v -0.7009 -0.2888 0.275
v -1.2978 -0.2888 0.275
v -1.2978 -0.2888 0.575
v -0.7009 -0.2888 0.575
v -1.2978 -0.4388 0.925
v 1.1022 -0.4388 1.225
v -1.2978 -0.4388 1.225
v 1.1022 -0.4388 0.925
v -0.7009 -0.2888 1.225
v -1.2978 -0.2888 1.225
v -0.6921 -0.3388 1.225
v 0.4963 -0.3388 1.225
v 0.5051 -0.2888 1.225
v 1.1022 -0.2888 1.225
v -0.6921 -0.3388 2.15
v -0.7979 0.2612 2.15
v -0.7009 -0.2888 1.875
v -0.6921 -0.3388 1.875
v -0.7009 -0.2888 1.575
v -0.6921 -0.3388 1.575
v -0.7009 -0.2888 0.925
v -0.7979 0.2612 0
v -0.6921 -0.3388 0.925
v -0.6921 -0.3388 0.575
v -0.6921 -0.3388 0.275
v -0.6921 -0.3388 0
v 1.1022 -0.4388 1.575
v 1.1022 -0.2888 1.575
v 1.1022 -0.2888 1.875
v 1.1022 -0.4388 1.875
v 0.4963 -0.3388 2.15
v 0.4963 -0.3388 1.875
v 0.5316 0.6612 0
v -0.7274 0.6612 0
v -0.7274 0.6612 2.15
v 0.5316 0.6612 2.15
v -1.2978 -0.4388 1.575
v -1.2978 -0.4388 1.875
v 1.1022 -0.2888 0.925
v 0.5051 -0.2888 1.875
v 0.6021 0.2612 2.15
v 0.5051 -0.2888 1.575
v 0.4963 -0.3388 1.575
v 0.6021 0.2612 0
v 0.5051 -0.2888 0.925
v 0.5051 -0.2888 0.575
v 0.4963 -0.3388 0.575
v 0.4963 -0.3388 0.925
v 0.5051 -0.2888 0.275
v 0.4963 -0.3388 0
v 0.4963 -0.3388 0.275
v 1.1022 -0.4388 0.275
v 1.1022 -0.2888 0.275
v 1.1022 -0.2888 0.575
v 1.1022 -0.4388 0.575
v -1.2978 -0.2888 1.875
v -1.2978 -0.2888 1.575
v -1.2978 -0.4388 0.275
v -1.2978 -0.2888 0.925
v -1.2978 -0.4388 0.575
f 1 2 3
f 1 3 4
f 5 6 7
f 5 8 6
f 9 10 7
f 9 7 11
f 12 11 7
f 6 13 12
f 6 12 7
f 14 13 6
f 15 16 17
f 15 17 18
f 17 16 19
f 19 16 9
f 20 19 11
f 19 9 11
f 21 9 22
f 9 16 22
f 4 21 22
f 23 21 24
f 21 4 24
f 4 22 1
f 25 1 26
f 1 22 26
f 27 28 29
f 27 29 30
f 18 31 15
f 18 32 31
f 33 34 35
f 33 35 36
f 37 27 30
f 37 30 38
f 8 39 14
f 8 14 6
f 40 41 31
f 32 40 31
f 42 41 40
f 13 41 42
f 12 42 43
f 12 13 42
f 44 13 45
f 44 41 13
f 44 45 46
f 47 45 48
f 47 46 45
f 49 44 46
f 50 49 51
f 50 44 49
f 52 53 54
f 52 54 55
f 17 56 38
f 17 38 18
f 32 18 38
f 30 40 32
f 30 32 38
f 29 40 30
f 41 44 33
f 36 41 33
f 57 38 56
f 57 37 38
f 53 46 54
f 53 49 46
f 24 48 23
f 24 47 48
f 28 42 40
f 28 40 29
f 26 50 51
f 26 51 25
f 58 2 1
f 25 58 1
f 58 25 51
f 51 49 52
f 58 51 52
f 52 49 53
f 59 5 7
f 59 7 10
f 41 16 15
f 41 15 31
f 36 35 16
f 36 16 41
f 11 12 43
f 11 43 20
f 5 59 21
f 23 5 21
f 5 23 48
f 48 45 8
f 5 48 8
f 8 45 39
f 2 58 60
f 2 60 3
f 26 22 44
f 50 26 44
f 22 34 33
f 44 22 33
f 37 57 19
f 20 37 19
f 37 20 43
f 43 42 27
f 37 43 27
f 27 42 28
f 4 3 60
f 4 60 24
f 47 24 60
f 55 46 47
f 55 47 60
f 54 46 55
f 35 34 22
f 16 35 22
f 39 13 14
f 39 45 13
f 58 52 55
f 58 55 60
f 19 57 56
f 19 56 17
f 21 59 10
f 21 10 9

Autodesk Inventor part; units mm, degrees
ref_plane "YZ Plane" through (0, 0, 0) normal (1, 0, 0) x (0, 1, 0)
ref_plane "XZ Plane" through (0, 0, 0) normal (0, 1, 0) x (-1, 0, 0)
sketch "Sketch1" plane through (0, 0, 0) normal (0, 0, 1) x (1, 0, 0)
  line L0 (-0.7979, 0.6612) -> (0.6021, 0.6612)
  line L1 (0.6021, 0.6612) -> (0.6021, -0.3388)
  line L2 (0.6021, -0.3388) -> (-0.7979, -0.3388)
  line L3 (-0.7979, -0.3388) -> (-0.7979, 0.6612)
  line L4 (-0.7979, 0.2612) -> (0.6021, 0.2612)
  line L5 (-0.7274, 0.6612) -> (-0.7979, 0.2612)
  line L6 (-0.7979, 0.2612) -> (-0.6921, -0.3388)
  line L7 (0.6021, 0.2612) -> (0.4963, -0.3388)
  line L8 (0.6021, 0.2612) -> (0.5316, 0.6612)
  point P0 (0, 0)
  dimension "d0" = 1.4
  dimension "d1" = 1
  dimension "d2" = 0.4
  dimension "d3" = 10
  dimension "d4" = 10
  dimension "d5" = 10
extrude "Extrusion1" add sketch "Sketch1" along normal blind 2.15 contours L0 L8 L4 L5 | L4 L7 L2 L6
ref_plane "Work Plane1" through (0, 0, 1.725) normal (0, 0, 1) x (1, 0, 0)
sketch "Sketch2" plane through (0, 0, 1.725) normal (0, 0, 1) x (1, 0, 0)
  line L0 (-1.2978, -0.2888) -> (1.1022, -0.2888)
  line L1 (1.1022, -0.2888) -> (1.1022, -0.4388)
  line L2 (1.1022, -0.4388) -> (-1.2978, -0.4388)
  line L3 (-1.2978, -0.4388) -> (-1.2978, -0.2888)
  line L4 (0.5316, 0.6612) -> (-0.7274, 0.6612) projected
  point P0 (0, 0)
  dimension "d9" = 1.1
  dimension "d10" = 0.15
  dimension "d11" = 2.4
extrude "Extrusion2" add sketch "Sketch2" along normal mid plane 0.3
pattern_linear "Rectangular Pattern1" count 3 spacing 0.65 along (0, 0, -1) of "Extrusion2"
properties part number "DualSchmittTrig"
